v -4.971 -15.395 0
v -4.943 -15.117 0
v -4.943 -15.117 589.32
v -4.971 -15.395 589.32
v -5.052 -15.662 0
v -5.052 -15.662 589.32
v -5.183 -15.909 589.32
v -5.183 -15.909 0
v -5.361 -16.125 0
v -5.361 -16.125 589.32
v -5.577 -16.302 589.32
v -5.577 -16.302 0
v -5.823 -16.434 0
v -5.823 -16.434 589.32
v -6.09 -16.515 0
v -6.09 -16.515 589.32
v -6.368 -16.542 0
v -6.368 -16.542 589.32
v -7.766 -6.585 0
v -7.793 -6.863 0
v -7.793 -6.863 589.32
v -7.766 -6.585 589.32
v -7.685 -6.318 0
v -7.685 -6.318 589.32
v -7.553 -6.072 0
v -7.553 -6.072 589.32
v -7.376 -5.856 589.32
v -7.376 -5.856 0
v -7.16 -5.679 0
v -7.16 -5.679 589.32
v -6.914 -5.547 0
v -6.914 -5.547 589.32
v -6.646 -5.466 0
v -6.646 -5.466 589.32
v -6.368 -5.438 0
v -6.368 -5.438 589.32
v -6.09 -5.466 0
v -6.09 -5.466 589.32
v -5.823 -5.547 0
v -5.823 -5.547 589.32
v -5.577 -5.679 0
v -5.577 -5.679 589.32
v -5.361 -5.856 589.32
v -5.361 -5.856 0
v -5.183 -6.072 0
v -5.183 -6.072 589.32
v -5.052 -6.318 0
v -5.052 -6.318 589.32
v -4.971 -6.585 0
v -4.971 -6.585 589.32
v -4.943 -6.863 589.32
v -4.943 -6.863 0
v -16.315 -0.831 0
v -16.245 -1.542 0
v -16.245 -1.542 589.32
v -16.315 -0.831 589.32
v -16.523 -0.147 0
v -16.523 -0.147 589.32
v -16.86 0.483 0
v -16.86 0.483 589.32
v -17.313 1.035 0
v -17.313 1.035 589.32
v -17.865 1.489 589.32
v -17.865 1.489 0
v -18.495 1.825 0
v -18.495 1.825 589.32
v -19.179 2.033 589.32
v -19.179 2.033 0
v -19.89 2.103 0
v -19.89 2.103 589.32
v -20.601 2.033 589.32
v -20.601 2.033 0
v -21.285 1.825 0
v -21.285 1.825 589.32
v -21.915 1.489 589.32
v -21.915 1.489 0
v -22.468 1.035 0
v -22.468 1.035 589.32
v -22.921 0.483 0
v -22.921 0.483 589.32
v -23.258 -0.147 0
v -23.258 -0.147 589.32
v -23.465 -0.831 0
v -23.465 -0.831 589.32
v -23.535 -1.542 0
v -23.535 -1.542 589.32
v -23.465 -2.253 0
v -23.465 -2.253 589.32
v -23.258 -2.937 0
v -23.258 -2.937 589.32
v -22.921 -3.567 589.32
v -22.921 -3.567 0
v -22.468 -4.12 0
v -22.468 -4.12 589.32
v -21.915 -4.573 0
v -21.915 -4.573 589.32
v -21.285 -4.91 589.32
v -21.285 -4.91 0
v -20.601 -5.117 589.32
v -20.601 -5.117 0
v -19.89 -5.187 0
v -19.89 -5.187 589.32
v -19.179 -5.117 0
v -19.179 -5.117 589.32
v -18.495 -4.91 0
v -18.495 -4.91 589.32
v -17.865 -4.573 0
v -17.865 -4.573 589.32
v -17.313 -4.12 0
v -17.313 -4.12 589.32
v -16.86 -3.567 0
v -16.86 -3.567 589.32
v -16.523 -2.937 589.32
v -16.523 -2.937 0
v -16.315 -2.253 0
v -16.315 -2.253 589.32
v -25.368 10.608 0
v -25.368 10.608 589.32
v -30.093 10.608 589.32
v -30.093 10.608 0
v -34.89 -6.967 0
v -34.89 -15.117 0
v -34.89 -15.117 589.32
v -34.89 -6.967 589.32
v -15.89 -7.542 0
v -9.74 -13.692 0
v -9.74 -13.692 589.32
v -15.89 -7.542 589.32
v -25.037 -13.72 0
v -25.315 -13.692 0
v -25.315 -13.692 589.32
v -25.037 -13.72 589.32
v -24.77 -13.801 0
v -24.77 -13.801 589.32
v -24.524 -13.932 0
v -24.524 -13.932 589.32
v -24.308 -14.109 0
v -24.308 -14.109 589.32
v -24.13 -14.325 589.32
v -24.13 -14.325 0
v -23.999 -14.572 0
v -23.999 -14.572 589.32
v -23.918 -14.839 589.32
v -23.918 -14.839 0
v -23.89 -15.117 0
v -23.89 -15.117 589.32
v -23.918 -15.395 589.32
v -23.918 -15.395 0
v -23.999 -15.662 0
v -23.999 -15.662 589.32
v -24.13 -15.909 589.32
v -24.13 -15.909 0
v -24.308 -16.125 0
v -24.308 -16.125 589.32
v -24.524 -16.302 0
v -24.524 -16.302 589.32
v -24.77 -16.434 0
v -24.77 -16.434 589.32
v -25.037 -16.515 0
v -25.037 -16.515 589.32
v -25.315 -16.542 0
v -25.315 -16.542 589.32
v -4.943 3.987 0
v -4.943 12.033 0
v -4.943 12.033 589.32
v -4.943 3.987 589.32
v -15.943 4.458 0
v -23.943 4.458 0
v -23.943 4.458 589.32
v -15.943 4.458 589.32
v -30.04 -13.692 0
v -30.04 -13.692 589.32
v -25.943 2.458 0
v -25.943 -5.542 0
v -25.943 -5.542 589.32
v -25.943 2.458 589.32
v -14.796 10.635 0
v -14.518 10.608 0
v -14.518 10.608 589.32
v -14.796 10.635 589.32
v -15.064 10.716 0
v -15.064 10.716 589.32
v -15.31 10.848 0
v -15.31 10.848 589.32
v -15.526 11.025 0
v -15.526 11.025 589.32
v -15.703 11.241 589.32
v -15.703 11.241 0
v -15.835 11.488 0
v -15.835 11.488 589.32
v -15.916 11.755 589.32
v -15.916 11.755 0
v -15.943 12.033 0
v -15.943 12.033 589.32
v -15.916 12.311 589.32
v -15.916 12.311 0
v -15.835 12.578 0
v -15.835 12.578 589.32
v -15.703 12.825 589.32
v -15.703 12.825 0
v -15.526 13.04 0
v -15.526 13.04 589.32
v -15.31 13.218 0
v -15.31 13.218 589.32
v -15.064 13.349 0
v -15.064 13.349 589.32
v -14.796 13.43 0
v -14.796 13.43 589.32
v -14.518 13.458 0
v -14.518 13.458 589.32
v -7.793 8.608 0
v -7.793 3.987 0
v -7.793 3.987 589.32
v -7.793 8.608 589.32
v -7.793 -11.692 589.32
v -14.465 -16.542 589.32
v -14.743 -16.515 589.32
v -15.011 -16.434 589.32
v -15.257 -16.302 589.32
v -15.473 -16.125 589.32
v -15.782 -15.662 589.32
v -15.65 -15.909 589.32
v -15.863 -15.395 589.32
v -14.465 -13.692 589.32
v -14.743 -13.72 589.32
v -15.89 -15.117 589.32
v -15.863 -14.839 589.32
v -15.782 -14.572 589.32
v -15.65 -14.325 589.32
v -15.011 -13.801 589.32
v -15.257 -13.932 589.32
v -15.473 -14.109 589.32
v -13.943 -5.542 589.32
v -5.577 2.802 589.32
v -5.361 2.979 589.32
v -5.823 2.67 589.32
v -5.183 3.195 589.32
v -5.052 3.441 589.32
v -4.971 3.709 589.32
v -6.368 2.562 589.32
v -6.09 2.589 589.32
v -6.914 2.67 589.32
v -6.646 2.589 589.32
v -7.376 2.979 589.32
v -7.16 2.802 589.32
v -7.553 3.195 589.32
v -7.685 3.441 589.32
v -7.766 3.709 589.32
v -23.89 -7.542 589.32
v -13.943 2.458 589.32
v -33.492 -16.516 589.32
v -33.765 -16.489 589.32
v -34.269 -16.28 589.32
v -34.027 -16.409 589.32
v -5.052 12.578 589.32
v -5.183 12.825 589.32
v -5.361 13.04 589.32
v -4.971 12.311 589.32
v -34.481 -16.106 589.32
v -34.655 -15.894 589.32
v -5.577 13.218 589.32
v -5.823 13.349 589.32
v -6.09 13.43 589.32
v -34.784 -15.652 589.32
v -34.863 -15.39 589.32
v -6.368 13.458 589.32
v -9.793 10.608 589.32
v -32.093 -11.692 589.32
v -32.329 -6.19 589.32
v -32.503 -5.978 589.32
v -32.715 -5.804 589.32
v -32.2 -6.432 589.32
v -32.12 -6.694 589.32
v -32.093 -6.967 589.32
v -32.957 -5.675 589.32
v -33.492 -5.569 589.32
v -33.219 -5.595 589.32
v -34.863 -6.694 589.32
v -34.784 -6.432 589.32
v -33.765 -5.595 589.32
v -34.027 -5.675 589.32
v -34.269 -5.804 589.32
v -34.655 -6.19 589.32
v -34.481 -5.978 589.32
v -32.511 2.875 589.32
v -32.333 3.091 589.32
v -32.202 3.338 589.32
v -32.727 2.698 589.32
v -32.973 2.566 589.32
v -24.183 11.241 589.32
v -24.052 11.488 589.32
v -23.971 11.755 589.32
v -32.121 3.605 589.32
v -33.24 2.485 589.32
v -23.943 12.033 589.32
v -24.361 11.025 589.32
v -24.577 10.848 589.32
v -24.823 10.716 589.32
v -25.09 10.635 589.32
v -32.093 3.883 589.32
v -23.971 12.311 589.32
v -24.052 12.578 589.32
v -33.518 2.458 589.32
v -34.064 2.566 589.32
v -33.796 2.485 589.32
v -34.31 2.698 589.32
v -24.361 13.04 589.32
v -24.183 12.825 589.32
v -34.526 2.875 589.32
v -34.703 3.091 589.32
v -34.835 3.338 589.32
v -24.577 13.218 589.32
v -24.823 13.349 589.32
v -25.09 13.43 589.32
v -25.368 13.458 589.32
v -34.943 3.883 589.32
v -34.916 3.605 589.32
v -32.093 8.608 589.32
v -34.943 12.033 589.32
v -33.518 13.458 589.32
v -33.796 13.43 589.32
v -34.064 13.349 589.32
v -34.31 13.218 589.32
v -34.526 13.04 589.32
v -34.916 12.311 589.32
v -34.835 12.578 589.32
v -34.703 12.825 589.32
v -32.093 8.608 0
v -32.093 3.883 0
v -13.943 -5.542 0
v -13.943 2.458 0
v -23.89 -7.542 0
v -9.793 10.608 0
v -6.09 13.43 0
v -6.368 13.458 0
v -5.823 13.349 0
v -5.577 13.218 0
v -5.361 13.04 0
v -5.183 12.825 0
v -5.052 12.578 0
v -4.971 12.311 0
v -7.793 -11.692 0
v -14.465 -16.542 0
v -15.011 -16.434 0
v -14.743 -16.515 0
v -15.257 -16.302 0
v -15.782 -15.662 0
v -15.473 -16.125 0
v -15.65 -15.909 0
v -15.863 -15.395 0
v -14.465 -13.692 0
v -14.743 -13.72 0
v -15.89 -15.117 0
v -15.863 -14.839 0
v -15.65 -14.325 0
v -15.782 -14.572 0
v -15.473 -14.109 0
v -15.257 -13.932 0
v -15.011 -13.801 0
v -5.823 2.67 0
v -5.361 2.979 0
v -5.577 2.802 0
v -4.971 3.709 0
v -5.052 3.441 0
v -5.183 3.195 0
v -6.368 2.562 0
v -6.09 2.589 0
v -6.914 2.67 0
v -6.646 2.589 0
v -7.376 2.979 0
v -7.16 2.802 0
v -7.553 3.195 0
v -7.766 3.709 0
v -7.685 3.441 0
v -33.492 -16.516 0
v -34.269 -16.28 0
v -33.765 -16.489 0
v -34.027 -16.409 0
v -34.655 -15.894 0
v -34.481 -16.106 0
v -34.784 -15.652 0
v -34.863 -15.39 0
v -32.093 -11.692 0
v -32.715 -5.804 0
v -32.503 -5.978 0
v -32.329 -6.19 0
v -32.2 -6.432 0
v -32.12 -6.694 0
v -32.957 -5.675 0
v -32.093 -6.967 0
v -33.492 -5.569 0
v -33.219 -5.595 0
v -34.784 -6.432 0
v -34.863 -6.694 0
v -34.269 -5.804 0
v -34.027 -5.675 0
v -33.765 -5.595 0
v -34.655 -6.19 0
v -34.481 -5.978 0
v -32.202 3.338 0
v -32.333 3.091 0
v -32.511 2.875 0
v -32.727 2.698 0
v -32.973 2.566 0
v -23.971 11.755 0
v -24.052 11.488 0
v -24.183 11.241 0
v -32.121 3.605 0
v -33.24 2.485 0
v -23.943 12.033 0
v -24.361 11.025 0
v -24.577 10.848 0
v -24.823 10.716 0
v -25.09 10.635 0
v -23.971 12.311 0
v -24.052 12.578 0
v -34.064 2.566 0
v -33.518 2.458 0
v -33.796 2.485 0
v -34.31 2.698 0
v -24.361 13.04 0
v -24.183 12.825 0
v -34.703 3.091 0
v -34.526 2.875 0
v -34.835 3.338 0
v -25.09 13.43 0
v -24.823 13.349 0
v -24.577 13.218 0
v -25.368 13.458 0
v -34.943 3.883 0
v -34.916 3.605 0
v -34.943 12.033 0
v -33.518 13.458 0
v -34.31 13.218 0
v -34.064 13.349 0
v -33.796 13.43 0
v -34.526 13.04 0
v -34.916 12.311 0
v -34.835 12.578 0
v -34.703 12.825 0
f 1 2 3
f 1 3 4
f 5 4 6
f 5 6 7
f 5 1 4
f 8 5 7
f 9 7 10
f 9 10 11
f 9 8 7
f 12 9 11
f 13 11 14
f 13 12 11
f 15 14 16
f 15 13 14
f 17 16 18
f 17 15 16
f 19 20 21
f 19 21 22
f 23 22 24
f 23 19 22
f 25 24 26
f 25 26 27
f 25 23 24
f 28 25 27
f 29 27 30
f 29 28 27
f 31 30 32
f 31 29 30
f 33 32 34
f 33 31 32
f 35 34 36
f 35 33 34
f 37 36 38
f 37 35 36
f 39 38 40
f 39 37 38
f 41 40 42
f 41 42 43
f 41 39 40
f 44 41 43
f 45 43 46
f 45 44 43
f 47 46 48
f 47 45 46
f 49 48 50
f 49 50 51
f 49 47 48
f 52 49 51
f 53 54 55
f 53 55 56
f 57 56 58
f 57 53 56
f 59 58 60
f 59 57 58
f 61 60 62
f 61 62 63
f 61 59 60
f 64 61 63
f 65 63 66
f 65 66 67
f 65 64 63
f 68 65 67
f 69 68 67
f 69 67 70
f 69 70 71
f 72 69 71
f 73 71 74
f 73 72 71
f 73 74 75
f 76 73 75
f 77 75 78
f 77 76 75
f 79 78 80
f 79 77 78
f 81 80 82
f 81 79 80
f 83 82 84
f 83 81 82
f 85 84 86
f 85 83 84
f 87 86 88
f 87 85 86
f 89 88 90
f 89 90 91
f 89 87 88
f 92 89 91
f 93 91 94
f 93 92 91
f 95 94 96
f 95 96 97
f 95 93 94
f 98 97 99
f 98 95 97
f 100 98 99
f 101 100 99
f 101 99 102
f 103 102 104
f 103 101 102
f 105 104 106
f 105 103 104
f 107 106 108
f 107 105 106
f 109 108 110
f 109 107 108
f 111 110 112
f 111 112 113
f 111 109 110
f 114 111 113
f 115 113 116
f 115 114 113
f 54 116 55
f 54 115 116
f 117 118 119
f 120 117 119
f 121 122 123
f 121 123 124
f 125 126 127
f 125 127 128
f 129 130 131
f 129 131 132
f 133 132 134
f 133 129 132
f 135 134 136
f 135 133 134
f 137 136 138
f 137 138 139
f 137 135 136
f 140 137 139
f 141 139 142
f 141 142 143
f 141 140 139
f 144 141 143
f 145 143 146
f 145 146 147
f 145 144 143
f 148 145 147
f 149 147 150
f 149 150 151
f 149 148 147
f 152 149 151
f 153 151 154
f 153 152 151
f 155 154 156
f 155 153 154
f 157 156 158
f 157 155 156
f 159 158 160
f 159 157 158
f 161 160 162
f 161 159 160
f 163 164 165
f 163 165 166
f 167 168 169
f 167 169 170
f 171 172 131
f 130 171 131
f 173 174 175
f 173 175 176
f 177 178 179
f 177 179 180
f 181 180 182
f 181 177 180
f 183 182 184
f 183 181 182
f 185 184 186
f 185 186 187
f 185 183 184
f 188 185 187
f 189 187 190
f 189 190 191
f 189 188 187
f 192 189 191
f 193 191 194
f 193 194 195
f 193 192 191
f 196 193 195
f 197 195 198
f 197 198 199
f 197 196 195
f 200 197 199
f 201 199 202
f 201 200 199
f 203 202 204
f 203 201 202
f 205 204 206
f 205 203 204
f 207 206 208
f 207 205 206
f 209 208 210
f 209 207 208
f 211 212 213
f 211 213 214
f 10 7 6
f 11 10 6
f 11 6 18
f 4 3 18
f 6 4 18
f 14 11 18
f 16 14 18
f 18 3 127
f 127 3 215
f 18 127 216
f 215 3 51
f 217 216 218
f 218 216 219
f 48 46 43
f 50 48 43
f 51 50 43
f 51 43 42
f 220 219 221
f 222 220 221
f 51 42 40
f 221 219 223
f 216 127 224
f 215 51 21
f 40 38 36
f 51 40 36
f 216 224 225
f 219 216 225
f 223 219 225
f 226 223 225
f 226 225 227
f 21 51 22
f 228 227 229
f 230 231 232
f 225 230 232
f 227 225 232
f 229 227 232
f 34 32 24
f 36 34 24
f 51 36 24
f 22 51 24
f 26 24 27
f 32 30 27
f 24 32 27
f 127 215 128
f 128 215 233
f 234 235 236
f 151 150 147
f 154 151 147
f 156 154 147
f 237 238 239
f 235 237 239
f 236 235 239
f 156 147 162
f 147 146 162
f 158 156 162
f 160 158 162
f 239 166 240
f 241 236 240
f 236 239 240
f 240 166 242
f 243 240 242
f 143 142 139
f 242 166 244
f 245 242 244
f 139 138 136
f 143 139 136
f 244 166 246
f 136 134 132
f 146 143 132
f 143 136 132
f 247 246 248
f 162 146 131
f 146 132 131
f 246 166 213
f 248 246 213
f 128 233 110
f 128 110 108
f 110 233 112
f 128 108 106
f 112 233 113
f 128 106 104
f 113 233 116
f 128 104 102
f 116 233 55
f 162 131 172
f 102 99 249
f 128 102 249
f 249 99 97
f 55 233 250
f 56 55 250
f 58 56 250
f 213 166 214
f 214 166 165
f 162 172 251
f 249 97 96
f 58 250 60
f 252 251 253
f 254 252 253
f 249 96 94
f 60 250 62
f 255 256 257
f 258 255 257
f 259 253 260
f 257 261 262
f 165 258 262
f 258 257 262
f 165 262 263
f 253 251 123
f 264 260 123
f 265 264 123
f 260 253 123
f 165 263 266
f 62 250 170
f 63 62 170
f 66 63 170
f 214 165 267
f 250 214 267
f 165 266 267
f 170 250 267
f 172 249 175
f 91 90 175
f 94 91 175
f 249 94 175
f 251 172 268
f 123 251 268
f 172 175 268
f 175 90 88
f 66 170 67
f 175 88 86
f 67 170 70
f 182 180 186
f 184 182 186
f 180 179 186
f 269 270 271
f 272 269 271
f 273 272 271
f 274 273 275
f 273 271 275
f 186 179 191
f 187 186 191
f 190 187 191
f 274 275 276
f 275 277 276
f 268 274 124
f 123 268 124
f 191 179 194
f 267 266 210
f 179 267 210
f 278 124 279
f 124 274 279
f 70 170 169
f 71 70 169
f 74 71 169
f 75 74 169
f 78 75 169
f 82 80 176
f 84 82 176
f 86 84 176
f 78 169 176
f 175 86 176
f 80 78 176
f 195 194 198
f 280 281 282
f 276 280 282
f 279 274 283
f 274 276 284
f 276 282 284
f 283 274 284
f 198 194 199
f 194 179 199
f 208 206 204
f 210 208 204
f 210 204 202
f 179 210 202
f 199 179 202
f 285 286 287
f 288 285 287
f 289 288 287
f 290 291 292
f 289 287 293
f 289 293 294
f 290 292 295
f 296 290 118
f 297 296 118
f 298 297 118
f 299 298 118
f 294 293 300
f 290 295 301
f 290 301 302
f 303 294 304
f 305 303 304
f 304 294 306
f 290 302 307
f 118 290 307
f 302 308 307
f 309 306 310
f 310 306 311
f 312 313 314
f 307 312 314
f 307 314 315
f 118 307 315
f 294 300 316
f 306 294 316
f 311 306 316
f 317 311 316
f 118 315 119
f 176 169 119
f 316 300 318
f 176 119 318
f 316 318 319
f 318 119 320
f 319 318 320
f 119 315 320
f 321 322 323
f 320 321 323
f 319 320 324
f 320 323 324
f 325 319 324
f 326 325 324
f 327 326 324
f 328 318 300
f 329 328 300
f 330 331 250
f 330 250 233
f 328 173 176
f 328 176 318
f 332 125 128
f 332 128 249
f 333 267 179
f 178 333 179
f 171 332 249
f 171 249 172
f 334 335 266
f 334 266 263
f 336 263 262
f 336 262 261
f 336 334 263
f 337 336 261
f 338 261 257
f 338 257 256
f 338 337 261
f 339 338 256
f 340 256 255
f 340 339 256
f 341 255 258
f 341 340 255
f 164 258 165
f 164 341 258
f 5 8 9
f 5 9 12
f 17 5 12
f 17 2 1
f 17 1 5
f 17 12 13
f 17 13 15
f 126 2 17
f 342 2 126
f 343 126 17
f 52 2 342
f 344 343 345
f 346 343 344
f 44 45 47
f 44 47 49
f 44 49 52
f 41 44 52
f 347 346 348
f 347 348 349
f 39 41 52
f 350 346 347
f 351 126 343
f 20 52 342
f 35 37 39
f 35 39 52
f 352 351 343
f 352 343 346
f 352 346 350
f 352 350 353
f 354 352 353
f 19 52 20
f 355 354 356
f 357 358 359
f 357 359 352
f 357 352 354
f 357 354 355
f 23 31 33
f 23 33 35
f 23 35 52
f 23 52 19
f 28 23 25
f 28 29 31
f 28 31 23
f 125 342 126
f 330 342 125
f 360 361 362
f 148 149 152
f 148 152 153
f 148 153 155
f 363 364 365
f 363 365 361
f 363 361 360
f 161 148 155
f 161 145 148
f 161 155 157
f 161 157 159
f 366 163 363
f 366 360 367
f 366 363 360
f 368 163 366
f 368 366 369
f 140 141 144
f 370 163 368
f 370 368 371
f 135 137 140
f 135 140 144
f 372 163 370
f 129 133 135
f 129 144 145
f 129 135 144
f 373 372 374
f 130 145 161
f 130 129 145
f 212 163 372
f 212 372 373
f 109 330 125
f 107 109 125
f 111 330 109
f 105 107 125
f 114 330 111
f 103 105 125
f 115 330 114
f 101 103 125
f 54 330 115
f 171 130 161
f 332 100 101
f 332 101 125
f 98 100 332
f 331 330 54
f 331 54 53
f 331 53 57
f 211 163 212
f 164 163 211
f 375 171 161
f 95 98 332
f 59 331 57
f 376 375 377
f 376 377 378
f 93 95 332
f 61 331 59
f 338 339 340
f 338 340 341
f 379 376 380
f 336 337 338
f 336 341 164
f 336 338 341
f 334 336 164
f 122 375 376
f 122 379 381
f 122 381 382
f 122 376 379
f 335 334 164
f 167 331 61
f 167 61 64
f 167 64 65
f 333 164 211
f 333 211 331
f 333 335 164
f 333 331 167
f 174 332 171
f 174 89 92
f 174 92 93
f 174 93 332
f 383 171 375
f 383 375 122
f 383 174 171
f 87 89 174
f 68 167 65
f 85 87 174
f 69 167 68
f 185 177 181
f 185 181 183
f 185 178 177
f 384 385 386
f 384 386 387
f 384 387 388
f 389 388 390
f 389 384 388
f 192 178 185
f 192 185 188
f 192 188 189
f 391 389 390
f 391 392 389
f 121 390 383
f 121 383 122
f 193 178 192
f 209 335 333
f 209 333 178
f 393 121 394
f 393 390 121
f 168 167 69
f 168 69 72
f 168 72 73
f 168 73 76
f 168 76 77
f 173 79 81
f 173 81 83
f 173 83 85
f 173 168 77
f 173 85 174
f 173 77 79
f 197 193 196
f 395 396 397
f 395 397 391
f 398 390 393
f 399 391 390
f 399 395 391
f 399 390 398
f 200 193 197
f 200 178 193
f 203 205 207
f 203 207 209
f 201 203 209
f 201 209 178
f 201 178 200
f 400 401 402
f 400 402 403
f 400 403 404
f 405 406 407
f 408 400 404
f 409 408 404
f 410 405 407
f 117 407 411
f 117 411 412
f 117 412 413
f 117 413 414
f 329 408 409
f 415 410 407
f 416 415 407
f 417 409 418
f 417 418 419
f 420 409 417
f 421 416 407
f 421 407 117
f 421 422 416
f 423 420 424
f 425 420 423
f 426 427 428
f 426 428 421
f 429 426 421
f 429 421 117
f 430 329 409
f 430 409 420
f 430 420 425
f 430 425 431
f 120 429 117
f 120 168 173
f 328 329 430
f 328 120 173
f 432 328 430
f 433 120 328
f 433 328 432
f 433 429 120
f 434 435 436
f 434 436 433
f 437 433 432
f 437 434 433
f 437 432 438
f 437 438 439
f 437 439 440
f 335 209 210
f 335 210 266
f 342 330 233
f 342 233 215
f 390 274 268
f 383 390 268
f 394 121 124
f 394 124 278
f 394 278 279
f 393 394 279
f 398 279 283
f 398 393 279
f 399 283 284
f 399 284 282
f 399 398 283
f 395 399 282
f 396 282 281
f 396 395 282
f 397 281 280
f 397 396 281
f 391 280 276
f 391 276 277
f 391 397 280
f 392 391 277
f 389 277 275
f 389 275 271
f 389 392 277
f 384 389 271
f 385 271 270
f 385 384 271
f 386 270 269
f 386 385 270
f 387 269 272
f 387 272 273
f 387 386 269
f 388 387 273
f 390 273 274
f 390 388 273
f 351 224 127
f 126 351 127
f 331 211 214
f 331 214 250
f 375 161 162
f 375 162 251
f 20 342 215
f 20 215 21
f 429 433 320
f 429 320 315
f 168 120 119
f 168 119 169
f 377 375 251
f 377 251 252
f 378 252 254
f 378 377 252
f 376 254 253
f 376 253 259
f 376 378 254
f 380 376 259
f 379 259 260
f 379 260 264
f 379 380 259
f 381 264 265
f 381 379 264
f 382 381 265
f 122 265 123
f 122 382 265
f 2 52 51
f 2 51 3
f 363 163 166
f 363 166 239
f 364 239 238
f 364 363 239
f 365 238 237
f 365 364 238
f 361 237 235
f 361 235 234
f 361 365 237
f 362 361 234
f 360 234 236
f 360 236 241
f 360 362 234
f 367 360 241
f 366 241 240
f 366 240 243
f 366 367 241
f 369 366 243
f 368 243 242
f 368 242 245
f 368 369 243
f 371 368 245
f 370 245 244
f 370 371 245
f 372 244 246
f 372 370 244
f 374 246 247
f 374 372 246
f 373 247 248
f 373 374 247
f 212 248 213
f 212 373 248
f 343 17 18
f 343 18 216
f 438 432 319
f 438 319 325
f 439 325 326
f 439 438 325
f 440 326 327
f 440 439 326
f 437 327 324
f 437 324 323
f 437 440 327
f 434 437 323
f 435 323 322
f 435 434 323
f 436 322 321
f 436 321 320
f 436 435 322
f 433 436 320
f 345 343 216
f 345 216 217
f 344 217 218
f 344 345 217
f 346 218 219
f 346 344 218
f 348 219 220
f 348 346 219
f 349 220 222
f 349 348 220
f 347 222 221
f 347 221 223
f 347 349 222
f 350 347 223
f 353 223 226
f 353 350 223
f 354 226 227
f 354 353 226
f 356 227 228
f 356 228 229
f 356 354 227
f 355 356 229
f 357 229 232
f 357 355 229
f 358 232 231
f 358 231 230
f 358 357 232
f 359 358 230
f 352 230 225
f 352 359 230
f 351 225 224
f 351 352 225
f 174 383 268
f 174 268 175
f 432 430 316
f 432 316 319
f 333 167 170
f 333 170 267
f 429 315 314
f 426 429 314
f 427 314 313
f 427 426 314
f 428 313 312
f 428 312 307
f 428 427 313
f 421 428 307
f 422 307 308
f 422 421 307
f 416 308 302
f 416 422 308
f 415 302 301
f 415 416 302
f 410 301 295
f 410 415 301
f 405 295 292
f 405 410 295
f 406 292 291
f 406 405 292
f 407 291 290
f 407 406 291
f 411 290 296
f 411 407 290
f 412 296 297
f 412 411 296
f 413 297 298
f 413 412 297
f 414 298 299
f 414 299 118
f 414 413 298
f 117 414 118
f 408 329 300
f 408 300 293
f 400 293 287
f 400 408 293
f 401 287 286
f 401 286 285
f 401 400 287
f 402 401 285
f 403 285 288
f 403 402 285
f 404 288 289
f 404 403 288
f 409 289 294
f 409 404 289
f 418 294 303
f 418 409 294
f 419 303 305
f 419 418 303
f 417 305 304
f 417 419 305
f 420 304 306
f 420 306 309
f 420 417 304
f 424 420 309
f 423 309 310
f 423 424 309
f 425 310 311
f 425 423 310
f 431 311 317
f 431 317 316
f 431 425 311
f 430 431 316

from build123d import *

# Parameters (mm, degrees)
CROQUIS1_R              = 3.645
SALIENTE_EXTRUIR1_DEPTH = 589.32


with BuildPart() as part:
    # Croquis1 → Saliente-Extruir1 (new body)
    with BuildSketch(Plane.XY):
        with BuildLine():
            Line((-14.465321263, -13.692119562), (-9.740321263, -13.692119562))
            Line((-9.740321263, -13.692119562), (-15.890321263, -7.542119562))
            Line((-15.890321263, -7.542119562), (-23.890321263, -7.542119562))
            Line((-23.890321263, -7.542119562), (-30.040321263, -13.692119562))
            Line((-30.040321263, -13.692119562), (-25.315321263, -13.692119562))
            ThreePointArc((-25.315321263, -13.692119562), (-23.890321263, -15.117119562), (-25.315321263, -16.542119562))
            Line((-25.315321263, -16.542119562), (-33.491757035, -16.515683789))
            ThreePointArc((-33.491757035, -16.515683789), (-34.480691284, -16.106053811), (-34.890321263, -15.117119562))
            Line((-34.890321263, -15.117119562), (-34.890321263, -6.967119562))
            ThreePointArc((-34.890321263, -6.967119562), (-33.491757035, -5.568555335), (-32.093192808, -6.967119562))
            Line((-32.093192808, -6.967119562), (-32.093192808, -11.692119562))
            Line((-32.093192808, -11.692119562), (-25.943192808, -5.542119562))
            Line((-25.943192808, -5.542119562), (-25.943192808, 2.457880438))
            Line((-25.943192808, 2.457880438), (-32.093192808, 8.607880438))
            Line((-32.093192808, 8.607880438), (-32.093192808, 3.882880438))
            ThreePointArc((-32.093192808, 3.882880438), (-33.518192808, 2.457880438), (-34.943192808, 3.882880438))
            Line((-34.943192808, 3.882880438), (-34.943192808, 12.032833848))
            ThreePointArc((-34.943192808, 12.032833848), (-34.525819971, 13.040461011), (-33.518192808, 13.457833848))
            Line((-33.518192808, 13.457833848), (-25.368192808, 13.457833848))
            ThreePointArc((-25.368192808, 13.457833848), (-23.943192808, 12.032833848), (-25.368192808, 10.607833848))
            Line((-25.368192808, 10.607833848), (-30.093192808, 10.607833848))
            Line((-30.093192808, 10.607833848), (-23.943192808, 4.457833848))
            Line((-23.943192808, 4.457833848), (-15.943192808, 4.457833848))
            Line((-15.943192808, 4.457833848), (-9.793192808, 10.607833848))
            Line((-9.793192808, 10.607833848), (-14.518192808, 10.607833848))
            ThreePointArc((-14.518192808, 10.607833848), (-15.943192808, 12.032833848), (-14.518192808, 13.457833848))
            Line((-14.518192808, 13.457833848), (-6.368192808, 13.457833848))
            ThreePointArc((-6.368192808, 13.457833848), (-5.360565645, 13.040461011), (-4.943192808, 12.032833848))
            Line((-4.943192808, 12.032833848), (-4.943192808, 3.986577533))
            ThreePointArc((-4.943192808, 3.986577533), (-6.368192808, 2.561577533), (-7.793192808, 3.986577533))
            Line((-7.793192808, 3.986577533), (-7.793192808, 8.607833848))
            Line((-7.793192808, 8.607833848), (-13.943192808, 2.457833848))
            Line((-13.943192808, 2.457833848), (-13.943192808, -5.542166152))
            Line((-13.943192808, -5.542166152), (-7.793192808, -11.692166152))
            Line((-7.793192808, -11.692166152), (-7.793192808, -6.863422467))
            ThreePointArc((-7.793192808, -6.863422467), (-6.368192808, -5.438422467), (-4.943192808, -6.863422467))
            Line((-4.943192808, -6.863422467), (-4.943192808, -15.117119562))
            ThreePointArc((-4.943192808, -15.117119562), (-5.360565645, -16.124746725), (-6.368192808, -16.542119562))
            Line((-6.368192808, -16.542119562), (-14.465321263, -16.542119562))
            ThreePointArc((-14.465321263, -16.542119562), (-15.890321263, -15.117119562), (-14.465321263, -13.692119562))
        make_face()
        with Locations((-19.890321263, -1.542119562)):
            Circle(CROQUIS1_R, mode=Mode.SUBTRACT)
    extrude(amount=SALIENTE_EXTRUIR1_DEPTH)


solid = part.part
